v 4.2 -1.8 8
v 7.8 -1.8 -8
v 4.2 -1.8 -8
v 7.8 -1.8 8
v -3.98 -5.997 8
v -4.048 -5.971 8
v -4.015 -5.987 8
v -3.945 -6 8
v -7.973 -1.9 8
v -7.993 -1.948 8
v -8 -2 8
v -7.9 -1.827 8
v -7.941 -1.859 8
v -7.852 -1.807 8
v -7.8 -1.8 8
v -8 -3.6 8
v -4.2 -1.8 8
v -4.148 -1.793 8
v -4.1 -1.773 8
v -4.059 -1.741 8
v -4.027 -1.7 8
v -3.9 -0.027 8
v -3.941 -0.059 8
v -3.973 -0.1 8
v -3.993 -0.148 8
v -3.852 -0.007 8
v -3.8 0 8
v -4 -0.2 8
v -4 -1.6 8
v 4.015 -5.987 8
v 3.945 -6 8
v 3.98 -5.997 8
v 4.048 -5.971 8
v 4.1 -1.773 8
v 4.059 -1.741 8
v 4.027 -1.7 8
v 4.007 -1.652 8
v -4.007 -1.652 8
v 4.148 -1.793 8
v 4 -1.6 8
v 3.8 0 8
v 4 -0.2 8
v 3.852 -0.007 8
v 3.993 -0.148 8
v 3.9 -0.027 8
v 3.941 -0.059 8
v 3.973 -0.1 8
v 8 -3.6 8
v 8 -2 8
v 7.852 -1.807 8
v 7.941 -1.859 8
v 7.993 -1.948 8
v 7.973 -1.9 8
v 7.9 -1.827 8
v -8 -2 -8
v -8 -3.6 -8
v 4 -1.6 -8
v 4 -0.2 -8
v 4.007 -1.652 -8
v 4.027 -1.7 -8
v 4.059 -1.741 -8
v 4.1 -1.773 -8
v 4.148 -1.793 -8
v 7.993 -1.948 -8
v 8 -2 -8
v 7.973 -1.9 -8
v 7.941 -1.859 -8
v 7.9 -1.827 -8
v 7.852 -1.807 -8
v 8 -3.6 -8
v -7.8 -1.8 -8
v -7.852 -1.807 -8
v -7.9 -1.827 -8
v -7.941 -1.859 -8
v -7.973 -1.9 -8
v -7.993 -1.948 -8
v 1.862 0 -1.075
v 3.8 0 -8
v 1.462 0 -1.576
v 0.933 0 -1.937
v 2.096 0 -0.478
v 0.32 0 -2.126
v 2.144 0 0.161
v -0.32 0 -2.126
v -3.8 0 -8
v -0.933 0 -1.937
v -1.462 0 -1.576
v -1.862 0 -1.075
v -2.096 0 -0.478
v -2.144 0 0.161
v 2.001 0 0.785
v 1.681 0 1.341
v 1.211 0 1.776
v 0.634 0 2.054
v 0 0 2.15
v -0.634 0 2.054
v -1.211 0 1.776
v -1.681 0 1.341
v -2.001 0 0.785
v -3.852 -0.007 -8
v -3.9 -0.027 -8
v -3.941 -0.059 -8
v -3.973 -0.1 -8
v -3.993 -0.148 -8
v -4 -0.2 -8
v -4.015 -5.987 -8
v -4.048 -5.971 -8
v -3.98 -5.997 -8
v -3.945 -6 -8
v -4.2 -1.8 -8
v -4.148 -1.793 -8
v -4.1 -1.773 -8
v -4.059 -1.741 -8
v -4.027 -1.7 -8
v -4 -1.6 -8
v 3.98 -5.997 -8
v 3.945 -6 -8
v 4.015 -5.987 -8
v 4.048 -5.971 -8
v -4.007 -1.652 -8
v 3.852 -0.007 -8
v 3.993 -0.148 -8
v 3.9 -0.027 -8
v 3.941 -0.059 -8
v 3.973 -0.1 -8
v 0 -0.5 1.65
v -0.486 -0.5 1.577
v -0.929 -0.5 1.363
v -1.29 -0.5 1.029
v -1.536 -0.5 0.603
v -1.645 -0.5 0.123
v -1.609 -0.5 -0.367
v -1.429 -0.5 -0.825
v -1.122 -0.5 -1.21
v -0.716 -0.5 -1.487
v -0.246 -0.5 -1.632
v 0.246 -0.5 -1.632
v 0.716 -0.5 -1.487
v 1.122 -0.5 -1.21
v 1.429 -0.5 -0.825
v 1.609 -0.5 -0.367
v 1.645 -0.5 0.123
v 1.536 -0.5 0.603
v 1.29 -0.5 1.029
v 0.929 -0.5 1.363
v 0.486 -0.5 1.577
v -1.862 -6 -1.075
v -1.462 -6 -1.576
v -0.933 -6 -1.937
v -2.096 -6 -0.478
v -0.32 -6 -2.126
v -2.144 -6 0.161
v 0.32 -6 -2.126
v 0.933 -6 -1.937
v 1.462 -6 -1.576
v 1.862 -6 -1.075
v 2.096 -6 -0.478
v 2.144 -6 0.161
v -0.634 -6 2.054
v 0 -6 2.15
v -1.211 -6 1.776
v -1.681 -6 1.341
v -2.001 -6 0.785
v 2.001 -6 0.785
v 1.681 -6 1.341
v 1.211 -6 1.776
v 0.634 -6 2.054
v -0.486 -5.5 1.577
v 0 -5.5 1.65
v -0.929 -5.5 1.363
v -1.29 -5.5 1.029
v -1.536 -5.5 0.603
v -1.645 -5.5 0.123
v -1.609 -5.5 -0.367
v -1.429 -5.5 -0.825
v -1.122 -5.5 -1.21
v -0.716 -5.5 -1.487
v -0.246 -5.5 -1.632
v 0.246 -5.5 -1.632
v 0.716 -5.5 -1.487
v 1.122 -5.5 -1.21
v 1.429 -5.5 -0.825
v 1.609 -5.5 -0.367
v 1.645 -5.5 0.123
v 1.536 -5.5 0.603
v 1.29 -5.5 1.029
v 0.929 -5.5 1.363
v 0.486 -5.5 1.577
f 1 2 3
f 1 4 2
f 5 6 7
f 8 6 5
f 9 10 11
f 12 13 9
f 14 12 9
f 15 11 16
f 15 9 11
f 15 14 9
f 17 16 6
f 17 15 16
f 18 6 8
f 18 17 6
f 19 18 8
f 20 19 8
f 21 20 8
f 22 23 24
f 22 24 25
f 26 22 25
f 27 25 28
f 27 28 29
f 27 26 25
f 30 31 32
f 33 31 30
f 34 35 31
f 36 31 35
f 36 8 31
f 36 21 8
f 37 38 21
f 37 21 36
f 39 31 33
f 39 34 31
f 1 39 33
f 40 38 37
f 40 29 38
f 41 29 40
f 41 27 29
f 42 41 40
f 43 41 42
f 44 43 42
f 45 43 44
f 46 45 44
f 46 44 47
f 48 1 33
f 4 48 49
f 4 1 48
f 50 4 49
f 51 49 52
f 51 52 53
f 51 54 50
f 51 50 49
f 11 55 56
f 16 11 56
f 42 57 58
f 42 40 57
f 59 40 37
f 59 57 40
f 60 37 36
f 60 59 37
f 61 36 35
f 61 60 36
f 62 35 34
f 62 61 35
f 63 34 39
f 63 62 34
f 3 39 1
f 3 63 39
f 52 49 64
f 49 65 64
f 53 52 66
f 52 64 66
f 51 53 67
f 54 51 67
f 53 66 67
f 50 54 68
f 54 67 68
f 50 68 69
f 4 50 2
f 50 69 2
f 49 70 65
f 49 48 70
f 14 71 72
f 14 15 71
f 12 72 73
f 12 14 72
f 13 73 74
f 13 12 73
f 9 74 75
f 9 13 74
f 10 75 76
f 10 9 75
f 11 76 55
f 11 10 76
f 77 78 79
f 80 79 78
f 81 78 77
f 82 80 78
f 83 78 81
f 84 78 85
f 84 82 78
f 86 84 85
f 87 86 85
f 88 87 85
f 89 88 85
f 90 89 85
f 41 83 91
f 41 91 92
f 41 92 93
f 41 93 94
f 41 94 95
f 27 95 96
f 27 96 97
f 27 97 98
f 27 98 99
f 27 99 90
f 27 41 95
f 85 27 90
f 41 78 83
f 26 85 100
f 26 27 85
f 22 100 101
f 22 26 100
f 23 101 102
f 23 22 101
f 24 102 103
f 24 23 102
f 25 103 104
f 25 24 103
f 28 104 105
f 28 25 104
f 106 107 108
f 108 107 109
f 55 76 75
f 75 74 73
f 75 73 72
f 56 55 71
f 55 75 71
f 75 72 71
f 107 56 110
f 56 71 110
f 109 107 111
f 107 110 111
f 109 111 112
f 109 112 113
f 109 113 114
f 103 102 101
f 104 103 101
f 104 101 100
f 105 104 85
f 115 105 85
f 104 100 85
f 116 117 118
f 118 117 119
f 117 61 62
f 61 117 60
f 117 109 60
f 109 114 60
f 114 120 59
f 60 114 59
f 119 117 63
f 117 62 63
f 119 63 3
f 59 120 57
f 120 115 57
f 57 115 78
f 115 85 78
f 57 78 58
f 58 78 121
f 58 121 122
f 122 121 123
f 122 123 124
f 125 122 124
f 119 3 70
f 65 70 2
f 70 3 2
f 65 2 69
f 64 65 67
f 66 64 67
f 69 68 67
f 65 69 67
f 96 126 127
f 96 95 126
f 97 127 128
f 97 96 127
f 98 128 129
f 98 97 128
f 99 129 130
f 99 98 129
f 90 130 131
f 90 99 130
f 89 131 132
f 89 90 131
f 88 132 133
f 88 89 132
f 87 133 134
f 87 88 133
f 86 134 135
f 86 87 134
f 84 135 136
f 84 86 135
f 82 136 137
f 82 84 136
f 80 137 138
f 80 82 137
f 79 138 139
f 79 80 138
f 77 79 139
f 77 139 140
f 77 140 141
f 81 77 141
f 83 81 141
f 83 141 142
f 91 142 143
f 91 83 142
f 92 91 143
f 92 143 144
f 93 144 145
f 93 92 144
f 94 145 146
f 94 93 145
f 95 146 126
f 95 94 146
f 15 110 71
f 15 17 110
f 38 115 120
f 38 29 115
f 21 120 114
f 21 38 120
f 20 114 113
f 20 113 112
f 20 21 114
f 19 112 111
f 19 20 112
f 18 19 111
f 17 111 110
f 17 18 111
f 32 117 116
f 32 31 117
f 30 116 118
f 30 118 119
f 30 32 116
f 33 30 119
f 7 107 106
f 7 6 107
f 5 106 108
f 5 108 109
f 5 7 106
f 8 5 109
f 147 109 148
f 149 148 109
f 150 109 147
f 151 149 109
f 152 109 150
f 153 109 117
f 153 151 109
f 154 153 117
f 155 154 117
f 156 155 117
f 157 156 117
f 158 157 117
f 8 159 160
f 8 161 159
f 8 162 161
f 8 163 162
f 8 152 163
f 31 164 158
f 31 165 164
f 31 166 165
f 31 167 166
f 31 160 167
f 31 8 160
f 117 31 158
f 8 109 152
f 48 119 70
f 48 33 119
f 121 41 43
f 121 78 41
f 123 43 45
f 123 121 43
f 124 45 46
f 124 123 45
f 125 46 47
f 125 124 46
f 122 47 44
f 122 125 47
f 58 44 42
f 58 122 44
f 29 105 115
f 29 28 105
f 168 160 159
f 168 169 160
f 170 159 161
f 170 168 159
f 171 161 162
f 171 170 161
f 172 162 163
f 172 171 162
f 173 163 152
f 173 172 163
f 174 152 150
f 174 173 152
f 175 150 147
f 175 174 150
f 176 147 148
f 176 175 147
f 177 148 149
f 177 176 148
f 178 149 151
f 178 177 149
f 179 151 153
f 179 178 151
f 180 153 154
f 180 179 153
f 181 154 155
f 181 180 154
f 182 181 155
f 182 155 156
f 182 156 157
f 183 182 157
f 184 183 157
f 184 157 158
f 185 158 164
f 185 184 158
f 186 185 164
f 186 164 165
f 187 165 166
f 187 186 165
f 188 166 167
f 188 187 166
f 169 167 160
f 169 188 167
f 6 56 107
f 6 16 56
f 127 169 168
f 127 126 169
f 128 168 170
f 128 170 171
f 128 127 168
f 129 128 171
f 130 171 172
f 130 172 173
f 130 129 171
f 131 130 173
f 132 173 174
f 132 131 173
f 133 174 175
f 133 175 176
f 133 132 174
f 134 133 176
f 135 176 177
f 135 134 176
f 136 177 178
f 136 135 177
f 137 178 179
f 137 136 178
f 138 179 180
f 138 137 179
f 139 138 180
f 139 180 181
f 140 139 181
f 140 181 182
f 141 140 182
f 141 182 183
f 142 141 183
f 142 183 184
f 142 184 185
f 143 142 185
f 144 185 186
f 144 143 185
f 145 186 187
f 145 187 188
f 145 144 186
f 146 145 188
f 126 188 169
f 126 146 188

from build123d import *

# Parameters (mm, degrees)
EXTRUDE_1_DEPTH = 8
FILLET_1_R      = 0.2


with BuildPart() as part:
    # Эскиз1 → Бобышка-Вытянуть1 (new body, symmetric)
    with BuildSketch(Plane.XY):
        Polygon((4, 0), (-4, 0), (-4, -1.8), (-8, -1.8), (-8, -3.6), (-4, -6), (4, -6), (8, -3.6), (8, -1.8), (4, -1.8), align=None)
    extrude(amount=EXTRUDE_1_DEPTH, both=True)

    # Эскиз4 → Отверстие обработанное метчиком M42 (revolve, cut)
    with BuildSketch(Plane(origin=(0, 0, 0), x_dir=(0, 0, 1), z_dir=(1, 0, 0))):
        Polygon((0, 0), (0, 6), (2.15, 6), (1.65, 5.5), (1.65, 0.5), (2.15, 0), align=None)
    revolve(axis=Axis((0, 6.35, 0), (0, -1, 0)), mode=Mode.SUBTRACT)

    # Скругление1
    fillet_1_edges = [part.edges().sort_by_distance(p)[0] for p in [
        (-4, 0, 0),
        (4, 0, 0),
        (4, -1.8, 0),
        (8, -1.8, 0),
        (4, -6, 0),
        (-4, -6, 0),
        (-8, -1.8, 0),
        (-4, -1.8, 0),
    ]]
    fillet(fillet_1_edges, radius=FILLET_1_R)


solid = part.part
